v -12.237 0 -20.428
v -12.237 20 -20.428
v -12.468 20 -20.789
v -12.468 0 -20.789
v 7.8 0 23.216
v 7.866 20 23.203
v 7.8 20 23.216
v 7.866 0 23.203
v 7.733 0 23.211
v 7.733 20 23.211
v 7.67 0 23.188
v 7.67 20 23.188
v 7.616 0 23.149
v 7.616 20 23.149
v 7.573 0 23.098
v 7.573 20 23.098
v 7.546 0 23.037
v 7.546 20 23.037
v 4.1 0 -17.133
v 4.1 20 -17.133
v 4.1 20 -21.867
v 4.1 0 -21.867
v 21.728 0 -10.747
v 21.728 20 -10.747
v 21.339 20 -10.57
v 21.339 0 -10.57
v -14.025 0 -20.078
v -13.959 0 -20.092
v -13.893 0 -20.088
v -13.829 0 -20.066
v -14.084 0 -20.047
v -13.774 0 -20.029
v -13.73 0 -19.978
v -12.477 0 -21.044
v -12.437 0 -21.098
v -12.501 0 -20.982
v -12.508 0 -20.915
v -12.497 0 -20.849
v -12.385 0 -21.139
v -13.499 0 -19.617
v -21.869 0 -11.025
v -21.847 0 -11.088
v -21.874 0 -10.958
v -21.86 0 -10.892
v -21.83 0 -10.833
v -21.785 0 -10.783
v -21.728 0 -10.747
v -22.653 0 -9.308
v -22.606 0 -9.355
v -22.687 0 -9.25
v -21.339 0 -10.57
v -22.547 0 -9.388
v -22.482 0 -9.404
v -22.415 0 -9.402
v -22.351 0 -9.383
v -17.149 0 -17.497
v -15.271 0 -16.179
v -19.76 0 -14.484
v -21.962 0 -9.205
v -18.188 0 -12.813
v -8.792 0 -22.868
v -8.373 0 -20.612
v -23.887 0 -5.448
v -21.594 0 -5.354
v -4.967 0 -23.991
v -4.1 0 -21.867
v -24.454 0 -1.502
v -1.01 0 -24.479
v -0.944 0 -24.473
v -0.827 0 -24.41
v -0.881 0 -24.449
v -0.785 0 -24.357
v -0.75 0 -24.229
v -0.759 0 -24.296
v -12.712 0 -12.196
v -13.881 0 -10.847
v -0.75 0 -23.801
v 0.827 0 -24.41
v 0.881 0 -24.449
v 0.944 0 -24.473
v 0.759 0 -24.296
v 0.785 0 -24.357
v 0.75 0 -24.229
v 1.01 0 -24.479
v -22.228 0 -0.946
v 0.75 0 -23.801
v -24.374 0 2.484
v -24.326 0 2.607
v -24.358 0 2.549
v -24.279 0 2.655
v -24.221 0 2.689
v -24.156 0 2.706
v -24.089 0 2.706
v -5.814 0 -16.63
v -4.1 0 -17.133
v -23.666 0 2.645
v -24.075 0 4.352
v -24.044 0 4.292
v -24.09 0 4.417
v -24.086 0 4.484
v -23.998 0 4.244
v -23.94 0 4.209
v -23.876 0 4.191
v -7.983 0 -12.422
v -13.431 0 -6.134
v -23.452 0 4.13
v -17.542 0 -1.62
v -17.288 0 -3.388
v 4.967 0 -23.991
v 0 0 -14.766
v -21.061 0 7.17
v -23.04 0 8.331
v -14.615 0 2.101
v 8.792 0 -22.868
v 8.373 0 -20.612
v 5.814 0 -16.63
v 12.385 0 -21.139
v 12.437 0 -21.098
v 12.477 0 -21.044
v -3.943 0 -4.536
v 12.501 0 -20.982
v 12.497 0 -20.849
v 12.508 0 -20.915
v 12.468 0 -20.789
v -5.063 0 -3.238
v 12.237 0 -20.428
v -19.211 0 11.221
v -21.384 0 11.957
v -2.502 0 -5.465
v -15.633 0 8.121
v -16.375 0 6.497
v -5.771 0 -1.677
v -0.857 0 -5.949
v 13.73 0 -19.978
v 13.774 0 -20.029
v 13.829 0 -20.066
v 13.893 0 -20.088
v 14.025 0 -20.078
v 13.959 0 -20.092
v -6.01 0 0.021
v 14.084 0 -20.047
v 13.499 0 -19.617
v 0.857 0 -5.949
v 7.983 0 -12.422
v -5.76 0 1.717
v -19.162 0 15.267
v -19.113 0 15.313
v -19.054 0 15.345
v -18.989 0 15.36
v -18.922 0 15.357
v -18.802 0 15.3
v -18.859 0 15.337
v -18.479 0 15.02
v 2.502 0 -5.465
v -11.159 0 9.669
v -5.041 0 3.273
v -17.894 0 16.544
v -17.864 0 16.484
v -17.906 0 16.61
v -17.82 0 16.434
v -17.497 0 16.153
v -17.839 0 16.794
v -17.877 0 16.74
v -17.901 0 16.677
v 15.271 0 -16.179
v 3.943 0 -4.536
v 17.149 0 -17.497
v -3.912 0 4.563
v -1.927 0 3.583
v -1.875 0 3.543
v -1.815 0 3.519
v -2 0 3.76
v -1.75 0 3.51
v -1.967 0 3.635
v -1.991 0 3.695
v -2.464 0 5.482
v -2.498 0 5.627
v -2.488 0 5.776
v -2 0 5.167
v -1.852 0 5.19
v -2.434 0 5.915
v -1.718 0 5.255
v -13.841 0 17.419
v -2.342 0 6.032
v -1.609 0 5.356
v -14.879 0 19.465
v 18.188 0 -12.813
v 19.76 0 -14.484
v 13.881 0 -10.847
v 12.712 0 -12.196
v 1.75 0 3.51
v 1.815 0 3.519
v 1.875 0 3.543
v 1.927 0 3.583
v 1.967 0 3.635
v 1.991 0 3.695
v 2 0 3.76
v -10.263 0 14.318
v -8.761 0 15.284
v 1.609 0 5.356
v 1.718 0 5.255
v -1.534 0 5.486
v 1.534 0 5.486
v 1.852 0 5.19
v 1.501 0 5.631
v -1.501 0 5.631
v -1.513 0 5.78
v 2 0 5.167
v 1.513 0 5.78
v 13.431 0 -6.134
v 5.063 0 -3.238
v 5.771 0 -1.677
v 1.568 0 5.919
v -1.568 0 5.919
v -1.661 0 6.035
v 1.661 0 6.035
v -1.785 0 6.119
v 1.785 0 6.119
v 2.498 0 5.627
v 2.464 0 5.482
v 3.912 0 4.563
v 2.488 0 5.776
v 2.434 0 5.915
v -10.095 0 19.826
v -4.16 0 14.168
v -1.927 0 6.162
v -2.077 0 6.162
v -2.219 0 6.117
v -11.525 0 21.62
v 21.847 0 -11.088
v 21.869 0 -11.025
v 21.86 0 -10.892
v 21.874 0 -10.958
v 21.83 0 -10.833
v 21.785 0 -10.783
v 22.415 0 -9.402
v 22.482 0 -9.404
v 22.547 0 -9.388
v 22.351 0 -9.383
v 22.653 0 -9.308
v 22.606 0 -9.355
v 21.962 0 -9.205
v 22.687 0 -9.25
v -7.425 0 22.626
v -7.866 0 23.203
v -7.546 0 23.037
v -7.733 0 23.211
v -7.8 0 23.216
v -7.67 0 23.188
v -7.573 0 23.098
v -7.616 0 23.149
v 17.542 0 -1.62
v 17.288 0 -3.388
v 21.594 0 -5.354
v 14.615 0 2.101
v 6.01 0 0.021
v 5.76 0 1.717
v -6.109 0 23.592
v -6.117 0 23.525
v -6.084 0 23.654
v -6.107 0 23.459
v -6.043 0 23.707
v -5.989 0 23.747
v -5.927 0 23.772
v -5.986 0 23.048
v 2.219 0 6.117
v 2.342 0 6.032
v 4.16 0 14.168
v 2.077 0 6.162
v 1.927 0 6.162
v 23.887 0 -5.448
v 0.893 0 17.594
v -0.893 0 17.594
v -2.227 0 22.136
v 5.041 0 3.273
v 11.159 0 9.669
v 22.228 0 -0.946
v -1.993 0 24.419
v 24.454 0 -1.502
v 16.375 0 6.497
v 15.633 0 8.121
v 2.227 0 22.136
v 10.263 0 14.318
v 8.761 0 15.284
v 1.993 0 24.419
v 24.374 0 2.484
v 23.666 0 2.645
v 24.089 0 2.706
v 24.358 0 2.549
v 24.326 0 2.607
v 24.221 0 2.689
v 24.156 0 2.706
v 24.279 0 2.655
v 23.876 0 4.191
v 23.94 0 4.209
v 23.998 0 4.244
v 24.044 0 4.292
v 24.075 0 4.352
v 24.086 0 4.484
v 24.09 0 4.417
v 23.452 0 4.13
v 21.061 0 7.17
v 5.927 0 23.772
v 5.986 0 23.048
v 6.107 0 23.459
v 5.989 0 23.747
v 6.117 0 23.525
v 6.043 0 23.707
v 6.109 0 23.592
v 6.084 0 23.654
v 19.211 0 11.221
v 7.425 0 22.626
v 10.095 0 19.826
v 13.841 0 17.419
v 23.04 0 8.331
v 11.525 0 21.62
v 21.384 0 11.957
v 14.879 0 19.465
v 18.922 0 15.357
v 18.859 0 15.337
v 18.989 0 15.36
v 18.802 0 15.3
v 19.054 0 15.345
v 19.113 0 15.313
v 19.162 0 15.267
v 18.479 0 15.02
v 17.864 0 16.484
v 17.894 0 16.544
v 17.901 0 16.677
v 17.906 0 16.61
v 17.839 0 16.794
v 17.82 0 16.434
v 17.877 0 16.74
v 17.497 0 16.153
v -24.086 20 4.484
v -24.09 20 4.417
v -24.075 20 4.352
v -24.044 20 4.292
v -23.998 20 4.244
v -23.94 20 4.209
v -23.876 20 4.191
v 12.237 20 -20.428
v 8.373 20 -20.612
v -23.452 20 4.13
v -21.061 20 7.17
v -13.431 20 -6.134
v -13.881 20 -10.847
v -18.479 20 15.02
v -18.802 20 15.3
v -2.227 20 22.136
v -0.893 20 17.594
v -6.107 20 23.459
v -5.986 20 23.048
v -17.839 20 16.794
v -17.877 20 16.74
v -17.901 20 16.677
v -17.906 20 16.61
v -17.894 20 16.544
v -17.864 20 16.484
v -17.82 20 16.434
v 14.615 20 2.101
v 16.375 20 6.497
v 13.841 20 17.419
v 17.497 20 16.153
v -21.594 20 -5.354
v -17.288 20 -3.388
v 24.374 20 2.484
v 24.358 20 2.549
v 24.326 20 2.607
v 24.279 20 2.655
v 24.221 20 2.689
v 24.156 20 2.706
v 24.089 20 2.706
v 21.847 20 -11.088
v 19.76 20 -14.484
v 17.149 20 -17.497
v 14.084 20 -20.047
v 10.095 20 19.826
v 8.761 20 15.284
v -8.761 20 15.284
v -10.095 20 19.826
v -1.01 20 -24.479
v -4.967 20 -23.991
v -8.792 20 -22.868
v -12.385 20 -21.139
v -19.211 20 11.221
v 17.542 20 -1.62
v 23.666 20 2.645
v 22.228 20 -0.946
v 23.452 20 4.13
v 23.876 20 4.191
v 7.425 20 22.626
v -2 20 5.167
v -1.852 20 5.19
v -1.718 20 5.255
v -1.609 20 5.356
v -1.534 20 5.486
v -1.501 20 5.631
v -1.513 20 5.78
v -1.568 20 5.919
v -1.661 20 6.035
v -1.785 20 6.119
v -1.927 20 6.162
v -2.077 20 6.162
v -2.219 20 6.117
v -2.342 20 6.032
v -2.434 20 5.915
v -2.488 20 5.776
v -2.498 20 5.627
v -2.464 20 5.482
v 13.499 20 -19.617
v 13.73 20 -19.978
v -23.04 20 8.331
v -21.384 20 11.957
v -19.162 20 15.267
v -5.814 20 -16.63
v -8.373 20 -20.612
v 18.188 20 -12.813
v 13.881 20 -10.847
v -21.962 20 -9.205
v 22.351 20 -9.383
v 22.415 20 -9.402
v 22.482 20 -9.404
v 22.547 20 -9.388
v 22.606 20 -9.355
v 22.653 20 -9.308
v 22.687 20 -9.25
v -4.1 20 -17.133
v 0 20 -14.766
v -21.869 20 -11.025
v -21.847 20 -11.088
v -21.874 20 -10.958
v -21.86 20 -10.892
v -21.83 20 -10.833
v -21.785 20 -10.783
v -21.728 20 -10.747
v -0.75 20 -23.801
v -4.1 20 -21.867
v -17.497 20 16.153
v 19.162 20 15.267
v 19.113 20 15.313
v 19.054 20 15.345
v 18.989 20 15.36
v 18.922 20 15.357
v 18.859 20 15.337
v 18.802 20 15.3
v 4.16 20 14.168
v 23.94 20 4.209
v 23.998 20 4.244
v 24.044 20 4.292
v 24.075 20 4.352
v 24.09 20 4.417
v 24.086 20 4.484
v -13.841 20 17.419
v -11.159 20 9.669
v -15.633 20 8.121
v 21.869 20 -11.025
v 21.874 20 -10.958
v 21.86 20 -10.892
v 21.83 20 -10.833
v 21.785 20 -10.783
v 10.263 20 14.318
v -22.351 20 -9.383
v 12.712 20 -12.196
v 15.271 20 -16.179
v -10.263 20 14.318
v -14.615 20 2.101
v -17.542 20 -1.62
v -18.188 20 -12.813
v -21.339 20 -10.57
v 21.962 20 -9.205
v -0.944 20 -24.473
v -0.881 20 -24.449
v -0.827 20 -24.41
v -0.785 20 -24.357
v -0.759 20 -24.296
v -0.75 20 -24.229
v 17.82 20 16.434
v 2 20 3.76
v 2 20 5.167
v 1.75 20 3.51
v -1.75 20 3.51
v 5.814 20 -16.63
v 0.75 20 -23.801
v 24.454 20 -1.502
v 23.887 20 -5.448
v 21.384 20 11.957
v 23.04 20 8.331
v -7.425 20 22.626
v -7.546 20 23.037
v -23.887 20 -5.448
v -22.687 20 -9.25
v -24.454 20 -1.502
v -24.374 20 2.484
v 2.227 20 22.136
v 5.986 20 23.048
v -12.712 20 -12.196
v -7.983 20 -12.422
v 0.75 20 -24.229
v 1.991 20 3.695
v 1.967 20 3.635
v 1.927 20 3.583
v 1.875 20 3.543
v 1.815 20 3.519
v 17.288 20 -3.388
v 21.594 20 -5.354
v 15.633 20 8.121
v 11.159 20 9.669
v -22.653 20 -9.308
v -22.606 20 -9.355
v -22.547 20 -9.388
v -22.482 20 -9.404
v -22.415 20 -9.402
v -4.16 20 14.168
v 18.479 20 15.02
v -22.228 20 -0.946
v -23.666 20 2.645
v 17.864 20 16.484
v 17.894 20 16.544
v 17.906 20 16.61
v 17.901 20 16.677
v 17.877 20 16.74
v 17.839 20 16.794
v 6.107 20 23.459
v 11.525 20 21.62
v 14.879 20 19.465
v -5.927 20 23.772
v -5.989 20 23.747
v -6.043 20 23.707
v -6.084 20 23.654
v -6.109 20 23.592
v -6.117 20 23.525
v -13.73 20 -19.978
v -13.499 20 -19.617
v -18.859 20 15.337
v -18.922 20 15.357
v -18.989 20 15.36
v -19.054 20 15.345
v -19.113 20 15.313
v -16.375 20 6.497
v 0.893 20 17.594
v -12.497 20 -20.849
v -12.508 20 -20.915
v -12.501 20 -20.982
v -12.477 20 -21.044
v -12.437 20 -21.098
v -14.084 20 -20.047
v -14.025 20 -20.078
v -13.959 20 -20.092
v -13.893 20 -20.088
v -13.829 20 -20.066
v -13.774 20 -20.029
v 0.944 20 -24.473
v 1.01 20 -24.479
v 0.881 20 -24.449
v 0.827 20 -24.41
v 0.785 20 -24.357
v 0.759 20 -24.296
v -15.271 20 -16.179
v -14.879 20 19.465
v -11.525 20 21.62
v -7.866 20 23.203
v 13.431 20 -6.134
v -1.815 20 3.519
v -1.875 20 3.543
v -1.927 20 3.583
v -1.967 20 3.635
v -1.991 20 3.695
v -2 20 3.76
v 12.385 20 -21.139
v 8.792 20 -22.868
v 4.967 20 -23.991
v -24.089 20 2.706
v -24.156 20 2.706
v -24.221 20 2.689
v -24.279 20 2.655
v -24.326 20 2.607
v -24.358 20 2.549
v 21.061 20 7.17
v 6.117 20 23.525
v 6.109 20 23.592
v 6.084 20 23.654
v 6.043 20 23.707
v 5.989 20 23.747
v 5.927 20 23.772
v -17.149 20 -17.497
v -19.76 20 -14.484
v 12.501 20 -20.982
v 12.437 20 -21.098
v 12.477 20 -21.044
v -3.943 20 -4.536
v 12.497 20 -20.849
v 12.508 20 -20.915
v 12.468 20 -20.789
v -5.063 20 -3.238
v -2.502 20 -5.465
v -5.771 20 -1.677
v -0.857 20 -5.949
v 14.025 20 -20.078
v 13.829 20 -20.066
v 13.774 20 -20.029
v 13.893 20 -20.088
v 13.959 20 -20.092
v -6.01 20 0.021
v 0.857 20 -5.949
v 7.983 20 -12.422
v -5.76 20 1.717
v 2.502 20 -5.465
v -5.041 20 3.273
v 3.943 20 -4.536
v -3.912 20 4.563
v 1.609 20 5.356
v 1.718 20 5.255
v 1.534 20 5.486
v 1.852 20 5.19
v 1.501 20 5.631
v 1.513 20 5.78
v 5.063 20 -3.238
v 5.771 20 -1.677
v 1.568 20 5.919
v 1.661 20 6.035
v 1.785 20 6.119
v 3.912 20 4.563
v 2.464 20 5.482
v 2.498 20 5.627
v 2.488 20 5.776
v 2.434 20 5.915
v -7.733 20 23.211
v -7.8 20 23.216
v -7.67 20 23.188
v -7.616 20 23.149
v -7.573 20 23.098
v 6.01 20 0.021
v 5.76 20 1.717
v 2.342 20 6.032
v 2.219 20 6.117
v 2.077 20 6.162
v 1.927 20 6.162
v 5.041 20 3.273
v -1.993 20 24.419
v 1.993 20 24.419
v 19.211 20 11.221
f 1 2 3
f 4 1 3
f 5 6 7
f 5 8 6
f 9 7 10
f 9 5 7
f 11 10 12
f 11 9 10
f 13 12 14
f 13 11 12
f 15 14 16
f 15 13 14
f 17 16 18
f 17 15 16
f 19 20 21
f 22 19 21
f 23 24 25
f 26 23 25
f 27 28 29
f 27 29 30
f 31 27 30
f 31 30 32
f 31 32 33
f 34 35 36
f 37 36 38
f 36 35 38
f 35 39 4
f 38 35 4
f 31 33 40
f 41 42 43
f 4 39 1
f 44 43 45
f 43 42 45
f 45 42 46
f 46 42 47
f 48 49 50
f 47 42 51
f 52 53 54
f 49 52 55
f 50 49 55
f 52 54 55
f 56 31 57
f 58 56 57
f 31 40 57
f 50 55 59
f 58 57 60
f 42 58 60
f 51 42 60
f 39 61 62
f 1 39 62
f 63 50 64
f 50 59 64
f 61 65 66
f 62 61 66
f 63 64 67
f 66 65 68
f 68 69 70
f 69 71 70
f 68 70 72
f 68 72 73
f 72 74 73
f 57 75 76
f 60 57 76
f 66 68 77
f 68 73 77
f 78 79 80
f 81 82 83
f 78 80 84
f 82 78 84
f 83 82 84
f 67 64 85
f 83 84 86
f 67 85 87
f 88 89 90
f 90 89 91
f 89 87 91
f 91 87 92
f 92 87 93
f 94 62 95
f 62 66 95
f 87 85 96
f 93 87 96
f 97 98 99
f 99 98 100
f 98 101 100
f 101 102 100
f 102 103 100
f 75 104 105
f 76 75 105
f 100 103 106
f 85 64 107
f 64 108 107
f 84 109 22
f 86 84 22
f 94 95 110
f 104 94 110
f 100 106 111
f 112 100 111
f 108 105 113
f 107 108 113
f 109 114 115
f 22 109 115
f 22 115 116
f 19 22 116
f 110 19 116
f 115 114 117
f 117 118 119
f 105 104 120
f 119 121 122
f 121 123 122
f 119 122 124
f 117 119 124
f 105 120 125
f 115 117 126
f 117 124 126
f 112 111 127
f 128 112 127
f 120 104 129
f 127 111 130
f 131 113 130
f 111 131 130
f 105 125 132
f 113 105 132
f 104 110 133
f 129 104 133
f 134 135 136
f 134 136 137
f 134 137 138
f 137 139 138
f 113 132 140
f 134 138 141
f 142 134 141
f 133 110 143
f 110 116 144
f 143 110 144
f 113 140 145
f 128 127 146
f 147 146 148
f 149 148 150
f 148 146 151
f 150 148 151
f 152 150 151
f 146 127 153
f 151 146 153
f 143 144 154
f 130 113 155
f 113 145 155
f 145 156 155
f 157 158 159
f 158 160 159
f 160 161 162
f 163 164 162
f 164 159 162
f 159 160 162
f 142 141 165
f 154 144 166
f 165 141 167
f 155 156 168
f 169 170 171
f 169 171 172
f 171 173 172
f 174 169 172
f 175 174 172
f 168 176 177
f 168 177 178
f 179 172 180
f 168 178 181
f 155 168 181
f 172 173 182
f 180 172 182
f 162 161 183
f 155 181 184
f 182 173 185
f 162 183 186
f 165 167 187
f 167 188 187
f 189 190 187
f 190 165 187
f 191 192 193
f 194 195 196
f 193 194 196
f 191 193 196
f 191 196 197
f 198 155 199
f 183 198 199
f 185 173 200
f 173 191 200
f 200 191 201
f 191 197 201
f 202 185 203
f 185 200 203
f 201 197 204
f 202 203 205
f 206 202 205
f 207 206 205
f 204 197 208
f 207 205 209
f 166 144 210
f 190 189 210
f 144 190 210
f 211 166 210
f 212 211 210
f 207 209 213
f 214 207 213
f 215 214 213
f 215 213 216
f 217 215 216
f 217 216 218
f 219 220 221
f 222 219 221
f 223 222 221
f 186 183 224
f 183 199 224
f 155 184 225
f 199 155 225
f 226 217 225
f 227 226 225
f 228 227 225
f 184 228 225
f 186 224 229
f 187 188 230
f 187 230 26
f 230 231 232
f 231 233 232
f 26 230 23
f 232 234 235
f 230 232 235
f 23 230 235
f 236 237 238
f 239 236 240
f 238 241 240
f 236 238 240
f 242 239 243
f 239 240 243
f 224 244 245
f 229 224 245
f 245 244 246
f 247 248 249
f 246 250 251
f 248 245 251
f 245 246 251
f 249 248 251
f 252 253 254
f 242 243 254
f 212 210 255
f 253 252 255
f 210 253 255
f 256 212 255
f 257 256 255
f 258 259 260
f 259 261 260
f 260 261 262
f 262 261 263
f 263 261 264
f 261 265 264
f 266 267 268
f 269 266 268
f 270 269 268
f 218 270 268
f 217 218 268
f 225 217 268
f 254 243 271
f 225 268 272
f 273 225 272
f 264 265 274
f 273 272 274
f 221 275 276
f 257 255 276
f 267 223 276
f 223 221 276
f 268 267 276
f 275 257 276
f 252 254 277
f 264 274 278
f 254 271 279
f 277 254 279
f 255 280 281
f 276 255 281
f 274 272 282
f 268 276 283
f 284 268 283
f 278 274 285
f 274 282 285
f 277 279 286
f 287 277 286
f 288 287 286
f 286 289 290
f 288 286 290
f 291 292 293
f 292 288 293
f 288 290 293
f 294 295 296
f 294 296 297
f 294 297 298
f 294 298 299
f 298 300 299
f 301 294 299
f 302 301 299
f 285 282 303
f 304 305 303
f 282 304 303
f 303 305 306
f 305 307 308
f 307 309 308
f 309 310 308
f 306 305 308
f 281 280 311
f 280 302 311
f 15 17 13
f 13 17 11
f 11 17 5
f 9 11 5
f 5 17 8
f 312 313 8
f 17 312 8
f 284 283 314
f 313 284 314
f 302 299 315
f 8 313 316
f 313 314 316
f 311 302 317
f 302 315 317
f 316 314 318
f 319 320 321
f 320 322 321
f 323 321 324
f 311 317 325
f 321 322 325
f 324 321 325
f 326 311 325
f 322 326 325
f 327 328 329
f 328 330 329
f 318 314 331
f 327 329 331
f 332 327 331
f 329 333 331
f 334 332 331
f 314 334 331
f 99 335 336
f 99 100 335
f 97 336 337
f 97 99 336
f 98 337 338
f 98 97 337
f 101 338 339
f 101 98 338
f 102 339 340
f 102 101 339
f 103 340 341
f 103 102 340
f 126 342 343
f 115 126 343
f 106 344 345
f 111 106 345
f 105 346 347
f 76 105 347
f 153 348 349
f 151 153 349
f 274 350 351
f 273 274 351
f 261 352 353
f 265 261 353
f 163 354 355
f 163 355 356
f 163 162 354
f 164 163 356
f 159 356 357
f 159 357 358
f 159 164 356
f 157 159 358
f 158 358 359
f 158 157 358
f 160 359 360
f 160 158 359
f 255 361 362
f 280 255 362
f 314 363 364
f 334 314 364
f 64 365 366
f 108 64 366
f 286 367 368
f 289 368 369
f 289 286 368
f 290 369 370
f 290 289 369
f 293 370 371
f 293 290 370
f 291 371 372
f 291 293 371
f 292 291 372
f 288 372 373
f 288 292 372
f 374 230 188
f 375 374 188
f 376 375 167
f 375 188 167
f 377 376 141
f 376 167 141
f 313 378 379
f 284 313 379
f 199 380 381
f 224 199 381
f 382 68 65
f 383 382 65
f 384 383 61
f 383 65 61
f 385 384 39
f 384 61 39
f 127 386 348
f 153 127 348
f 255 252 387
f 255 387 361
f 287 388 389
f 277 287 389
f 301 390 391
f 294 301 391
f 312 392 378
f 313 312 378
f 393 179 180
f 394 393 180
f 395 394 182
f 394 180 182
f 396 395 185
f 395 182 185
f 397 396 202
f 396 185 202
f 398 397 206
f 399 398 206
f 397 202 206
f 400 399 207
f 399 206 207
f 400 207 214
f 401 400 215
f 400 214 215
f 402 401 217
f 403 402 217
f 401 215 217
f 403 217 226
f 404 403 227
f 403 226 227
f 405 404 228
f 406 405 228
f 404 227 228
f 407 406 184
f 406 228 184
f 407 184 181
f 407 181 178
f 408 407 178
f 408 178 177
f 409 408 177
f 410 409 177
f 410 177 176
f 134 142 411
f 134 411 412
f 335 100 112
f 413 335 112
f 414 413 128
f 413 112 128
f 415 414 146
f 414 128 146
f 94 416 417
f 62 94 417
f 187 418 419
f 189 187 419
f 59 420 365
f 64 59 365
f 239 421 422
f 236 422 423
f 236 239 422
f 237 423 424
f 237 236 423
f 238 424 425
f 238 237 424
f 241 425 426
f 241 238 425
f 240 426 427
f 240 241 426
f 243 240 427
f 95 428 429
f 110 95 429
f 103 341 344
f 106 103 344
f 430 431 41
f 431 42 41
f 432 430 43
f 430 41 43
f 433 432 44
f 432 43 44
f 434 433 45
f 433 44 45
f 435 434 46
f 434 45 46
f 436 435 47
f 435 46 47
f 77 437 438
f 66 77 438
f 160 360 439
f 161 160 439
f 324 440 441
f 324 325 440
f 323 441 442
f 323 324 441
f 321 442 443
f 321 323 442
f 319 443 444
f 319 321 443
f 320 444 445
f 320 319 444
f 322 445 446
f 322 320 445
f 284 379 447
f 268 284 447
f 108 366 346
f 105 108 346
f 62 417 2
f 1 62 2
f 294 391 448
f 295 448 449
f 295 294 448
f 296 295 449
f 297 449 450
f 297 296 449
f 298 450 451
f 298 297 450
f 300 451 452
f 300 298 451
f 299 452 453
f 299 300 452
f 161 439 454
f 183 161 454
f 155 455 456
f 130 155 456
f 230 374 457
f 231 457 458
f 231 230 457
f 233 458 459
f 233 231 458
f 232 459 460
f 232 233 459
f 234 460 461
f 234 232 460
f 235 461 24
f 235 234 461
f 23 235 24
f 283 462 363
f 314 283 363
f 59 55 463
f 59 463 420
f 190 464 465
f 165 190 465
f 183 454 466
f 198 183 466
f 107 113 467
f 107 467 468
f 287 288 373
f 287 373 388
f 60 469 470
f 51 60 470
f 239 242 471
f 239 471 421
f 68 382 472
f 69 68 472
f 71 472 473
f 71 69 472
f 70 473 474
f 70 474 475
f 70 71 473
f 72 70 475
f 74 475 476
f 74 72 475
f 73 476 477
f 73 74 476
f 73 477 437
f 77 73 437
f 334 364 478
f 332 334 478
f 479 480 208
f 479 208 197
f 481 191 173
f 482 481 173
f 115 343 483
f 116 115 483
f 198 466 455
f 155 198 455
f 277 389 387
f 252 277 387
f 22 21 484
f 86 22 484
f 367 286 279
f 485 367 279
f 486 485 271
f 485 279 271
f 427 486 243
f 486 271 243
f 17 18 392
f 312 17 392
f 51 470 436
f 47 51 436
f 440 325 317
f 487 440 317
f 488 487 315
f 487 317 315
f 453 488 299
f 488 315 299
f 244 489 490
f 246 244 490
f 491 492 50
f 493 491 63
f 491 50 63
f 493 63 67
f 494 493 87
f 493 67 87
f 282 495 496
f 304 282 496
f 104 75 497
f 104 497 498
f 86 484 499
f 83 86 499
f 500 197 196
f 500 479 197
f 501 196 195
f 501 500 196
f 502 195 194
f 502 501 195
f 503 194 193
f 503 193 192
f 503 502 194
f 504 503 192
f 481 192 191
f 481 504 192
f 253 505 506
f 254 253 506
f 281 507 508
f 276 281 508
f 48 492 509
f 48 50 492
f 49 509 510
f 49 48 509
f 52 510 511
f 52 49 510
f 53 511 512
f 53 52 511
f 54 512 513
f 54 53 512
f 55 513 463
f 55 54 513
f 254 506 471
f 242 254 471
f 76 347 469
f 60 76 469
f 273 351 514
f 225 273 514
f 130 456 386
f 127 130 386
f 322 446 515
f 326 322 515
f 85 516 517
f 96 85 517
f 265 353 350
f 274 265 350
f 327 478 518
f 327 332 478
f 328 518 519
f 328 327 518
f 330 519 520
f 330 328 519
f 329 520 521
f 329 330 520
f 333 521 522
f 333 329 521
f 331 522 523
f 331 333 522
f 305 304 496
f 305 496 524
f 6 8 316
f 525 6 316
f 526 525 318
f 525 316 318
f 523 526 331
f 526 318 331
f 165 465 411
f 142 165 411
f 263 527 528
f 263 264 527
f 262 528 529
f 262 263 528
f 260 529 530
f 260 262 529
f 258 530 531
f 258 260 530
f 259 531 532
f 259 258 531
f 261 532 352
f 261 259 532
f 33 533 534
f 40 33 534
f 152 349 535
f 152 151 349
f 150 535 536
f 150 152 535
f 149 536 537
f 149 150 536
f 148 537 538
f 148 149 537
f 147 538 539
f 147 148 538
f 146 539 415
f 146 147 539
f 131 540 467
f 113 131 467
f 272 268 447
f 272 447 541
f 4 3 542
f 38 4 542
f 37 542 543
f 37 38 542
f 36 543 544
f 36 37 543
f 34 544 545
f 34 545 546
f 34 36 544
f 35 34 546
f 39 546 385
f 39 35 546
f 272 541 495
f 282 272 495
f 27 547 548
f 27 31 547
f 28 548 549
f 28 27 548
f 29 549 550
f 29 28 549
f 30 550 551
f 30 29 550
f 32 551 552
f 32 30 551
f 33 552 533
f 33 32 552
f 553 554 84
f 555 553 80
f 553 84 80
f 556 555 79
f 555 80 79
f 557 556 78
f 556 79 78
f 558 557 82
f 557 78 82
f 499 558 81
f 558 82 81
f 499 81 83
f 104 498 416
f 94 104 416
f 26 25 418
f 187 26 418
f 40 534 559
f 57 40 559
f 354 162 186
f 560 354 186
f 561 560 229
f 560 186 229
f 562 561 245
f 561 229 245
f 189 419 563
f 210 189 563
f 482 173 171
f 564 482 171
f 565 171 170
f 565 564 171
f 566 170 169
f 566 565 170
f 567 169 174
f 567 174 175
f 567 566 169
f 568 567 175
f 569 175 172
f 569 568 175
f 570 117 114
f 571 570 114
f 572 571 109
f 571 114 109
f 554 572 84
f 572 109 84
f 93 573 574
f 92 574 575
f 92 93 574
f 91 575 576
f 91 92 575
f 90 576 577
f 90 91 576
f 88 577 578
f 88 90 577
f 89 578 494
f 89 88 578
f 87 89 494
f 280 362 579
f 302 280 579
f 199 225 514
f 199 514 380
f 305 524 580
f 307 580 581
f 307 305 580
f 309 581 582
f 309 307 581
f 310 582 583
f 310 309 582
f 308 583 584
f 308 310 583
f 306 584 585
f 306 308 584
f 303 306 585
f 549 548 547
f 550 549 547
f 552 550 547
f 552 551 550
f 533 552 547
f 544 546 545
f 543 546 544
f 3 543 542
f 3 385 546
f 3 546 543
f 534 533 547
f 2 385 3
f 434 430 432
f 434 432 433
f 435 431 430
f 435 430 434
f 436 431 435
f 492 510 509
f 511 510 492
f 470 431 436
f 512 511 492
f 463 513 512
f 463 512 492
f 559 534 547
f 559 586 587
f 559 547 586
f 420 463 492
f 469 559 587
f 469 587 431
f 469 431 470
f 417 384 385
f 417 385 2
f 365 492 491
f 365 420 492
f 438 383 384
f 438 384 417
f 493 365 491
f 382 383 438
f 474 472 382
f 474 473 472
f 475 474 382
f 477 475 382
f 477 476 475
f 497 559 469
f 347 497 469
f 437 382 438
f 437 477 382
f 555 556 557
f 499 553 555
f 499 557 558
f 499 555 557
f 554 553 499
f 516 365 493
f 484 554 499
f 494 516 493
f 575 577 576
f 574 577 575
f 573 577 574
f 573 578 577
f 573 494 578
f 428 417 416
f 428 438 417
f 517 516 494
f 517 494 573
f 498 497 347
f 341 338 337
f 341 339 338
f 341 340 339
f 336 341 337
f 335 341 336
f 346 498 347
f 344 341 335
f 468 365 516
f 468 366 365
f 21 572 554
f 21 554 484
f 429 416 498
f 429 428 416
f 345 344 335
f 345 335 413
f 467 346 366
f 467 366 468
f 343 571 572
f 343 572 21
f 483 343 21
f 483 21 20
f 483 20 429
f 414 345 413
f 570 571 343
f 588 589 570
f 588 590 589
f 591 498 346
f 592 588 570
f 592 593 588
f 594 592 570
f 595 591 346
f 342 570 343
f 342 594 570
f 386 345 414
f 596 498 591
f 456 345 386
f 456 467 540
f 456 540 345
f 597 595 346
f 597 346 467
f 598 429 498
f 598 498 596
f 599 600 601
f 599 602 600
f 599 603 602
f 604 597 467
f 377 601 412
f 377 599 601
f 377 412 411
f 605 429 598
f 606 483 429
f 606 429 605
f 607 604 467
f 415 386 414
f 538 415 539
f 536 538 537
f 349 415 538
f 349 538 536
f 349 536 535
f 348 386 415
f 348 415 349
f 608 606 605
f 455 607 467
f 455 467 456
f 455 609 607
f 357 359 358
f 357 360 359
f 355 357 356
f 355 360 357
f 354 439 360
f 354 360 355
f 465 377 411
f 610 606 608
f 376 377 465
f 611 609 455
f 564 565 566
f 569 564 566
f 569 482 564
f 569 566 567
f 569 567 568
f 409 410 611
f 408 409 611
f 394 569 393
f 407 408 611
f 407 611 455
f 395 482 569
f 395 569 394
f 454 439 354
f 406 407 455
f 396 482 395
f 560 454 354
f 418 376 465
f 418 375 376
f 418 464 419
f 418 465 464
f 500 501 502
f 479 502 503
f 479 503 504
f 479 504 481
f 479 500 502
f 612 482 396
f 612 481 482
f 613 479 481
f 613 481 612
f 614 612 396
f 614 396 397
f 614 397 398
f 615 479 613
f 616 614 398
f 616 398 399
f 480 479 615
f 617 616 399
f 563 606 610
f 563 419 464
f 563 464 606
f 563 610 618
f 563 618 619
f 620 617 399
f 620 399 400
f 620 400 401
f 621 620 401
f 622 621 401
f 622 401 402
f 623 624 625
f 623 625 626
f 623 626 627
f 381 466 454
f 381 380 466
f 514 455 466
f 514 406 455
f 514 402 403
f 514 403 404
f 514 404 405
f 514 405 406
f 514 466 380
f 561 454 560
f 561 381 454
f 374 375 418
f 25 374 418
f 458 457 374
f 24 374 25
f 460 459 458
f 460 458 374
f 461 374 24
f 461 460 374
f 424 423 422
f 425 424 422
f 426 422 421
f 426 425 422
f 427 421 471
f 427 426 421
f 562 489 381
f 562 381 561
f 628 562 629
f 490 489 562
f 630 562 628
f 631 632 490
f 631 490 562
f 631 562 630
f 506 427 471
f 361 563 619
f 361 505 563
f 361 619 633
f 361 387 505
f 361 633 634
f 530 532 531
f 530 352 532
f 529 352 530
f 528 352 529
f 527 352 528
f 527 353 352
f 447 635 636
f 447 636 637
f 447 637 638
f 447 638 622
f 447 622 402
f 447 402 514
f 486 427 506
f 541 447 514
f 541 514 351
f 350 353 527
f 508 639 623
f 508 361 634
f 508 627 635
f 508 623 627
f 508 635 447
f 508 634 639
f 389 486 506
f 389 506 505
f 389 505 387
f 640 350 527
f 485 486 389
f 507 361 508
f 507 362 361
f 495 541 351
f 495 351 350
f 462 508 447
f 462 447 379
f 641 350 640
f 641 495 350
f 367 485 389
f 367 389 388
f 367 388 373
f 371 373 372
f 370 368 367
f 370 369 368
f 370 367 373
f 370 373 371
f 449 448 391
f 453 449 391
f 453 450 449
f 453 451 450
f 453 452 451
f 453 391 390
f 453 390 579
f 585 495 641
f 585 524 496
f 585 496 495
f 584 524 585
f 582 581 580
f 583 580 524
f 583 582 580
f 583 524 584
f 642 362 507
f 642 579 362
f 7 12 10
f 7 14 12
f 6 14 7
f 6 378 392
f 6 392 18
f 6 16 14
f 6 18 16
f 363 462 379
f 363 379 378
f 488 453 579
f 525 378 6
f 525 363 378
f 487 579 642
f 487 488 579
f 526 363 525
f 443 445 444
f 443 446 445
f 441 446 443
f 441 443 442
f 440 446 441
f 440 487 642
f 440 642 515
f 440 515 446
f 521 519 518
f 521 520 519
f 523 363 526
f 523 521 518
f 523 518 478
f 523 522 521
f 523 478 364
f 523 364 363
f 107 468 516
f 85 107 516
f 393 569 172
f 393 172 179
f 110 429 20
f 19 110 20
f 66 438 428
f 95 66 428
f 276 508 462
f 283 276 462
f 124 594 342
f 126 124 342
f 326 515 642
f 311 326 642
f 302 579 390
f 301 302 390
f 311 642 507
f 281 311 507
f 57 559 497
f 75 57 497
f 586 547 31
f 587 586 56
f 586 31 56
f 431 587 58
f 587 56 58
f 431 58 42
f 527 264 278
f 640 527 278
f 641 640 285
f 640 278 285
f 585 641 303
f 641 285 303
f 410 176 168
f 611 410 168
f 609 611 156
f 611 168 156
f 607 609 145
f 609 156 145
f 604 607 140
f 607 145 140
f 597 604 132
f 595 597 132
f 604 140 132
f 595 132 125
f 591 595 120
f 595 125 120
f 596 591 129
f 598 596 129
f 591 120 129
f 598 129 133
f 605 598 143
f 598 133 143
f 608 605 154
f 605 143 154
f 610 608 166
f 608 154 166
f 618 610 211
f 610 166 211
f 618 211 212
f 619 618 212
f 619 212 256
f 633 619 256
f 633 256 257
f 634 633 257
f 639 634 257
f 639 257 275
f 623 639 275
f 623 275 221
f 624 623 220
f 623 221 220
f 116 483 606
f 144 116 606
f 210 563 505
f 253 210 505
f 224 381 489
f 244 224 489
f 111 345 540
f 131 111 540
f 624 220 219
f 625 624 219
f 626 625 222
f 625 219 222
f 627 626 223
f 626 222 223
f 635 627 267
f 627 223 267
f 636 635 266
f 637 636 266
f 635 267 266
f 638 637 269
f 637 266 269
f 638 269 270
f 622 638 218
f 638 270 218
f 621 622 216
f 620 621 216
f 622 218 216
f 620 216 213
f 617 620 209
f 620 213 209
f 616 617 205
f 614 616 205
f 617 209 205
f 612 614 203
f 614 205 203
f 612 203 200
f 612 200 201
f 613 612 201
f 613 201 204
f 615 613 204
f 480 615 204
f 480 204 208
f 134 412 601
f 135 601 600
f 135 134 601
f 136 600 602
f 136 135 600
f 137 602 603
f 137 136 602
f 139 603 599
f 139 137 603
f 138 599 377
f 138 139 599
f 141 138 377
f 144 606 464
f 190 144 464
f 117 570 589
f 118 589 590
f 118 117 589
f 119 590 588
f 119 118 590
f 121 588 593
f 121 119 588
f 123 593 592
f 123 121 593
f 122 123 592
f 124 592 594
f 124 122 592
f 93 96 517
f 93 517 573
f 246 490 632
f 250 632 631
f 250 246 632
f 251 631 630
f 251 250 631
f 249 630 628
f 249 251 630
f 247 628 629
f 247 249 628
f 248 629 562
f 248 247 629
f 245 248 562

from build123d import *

# Parameters (mm, degrees)
SKETCH1_R                = 24.5
BOSS_EXTRUDE1_DEPTH      = 20
CUT_EXTRUDE1_DEPTH       = 41.006249512
FILLET1_R                = 0.25
CIRPATTERN1_COUNT        = 11
FILLET1_OF_CIRPATTERN1_R = 0.25
FILLET2_R                = 0.25


with BuildPart() as part:
    # Sketch1 → Boss-Extrude1 (new body)
    with BuildSketch(Plane(origin=(0, 0, 0), x_dir=(1, 0, 0), z_dir=(0, 1, 0))):
        with Locations(Location((0, 0, 0), (0, 0, 270))):
            Circle(SKETCH1_R)
        with BuildLine():
            Line((2, -5.167459748), (2, -3.51))
            Line((2, -3.51), (-2, -3.51))
            Line((-2, -3.51), (-2, -5.167459748))
            ThreePointArc((-2, -5.167459748), (-1.7197584, -6.081542645), (-2.464173015, -5.481601167))
            ThreePointArc((-2.464173015, -5.481601167), (0, 6.01), (2.464173015, -5.481601167))
            ThreePointArc((2.464173015, -5.481601167), (1.7197584, -6.081542645), (2, -5.167459748))
        make_face(mode=Mode.SUBTRACT)
    extrude(amount=BOSS_EXTRUDE1_DEPTH)

    # Sketch3 → Cut-Extrude1 (cut, through all)
    with BuildSketch(Plane(origin=(0, 20, 0), x_dir=(1, 0, 0), z_dir=(0, 1, 0))):
        Polygon((0.75, 23.801259505), (0.75, 24.5), (-0.75, 24.5), (-0.75, 23.801259505), (-4.1, 21.867136104), (-4.1, 17.132863896), (0, 14.765727793), (4.1, 17.132863896), (4.1, 21.867136104), align=None)
    cut_extrude1 = extrude(amount=-CUT_EXTRUDE1_DEPTH, mode=Mode.SUBTRACT)

    # Fillet1
    fillet1_edges = [part.edges().sort_by_distance(p)[0] for p in [
        (0.75, 10, -24.488517717),
        (-0.75, 10, -24.488517717),
    ]]
    fillet(fillet1_edges, radius=FILLET1_R)

    # CirPattern1: Cut-Extrude1 ×11 about axis
    cirpattern1_axis = Axis((0, 0, 0), (0, 1, 0))
    for i in range(1, CIRPATTERN1_COUNT):
        add(cut_extrude1.rotate(cirpattern1_axis, i * 360 / CIRPATTERN1_COUNT), mode=Mode.SUBTRACT)

    # Fillet1 of CirPattern1
    fillet1_of_cirpattern1_edges = [part.edges().sort_by_distance(p)[0] for p in [
        (-12.608552087, 10, -21.006532657),
        (-13.870432387, 10, -20.195571431),
        (-21.963977975, 10, -10.855121903),
        (-22.587100494, 10, -9.490673909),
        (-24.345996045, 10, 2.742713357),
        (-24.132523788, 10, 4.22744552),
        (-18.998332392, 10, 15.469756505),
        (-18.016041291, 10, 16.603380866),
        (-7.61883244, 10, 23.285261267),
        (-6.17959298, 10, 23.707860102),
        (6.17959298, 10, 23.707860102),
        (7.61883244, 10, 23.285261267),
        (18.016041291, 10, 16.603380866),
        (18.998332392, 10, 15.469756505),
        (24.132523788, 10, 4.22744552),
        (24.345996045, 10, 2.742713357),
        (22.587100494, 10, -9.490673909),
        (21.963977975, 10, -10.855121903),
        (13.870432387, 10, -20.195571431),
        (12.608552087, 10, -21.006532657),
    ]]
    fillet(fillet1_of_cirpattern1_edges, radius=FILLET1_OF_CIRPATTERN1_R)

    # Fillet2
    fillet2_edges = [part.edges().sort_by_distance(p)[0] for p in [
        (-2, 10, 3.51),
        (2, 10, 3.51),
    ]]
    fillet(fillet2_edges, radius=FILLET2_R)


solid = part.part
